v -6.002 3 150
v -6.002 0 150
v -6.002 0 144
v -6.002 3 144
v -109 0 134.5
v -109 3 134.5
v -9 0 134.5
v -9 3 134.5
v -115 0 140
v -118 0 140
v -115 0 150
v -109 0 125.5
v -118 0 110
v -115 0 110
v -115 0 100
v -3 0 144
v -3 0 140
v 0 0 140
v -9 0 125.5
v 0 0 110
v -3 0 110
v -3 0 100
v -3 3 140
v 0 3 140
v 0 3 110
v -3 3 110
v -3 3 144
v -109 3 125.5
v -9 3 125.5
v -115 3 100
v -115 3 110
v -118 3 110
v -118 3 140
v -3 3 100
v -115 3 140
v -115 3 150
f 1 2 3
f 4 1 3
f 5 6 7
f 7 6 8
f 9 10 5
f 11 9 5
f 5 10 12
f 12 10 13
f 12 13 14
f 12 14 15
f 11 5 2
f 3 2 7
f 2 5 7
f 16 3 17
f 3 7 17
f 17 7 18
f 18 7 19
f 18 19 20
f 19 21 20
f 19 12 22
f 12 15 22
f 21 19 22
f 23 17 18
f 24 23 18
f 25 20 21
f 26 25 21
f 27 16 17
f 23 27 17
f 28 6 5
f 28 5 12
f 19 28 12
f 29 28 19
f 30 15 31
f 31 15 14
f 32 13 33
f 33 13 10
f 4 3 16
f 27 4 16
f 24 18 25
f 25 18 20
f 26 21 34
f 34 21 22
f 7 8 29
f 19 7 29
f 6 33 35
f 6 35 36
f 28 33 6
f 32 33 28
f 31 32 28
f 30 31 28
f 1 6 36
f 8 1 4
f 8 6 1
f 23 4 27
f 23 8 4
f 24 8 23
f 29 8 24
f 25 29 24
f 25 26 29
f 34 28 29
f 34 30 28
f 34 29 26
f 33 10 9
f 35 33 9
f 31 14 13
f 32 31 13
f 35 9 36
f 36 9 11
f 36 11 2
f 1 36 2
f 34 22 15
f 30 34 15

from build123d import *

# Parameters (mm, degrees)
LED_1_OUTLINE_R     = 2.25
LED_1_DEPTH         = 3
SKETCH_1_W          = 100
SKETCH_1_H          = 9
CUT_EXTRUDE_1_DEPTH = 3


# Read off the part's stored shape, not the designer's step: 基体零件-LED板-1
with BuildPart() as part:
    # 基体零件-LED板-1 outline → 基体零件-LED板-1 (new body)
    with BuildSketch(Plane(origin=(0, 0, 0), x_dir=(1, 0, 0), z_dir=(0, 1, 0))):
        Polygon((-3, -140), (0, -140), (0, -110), (-3, -110), (-3, -100), (-115, -100), (-115, -110), (-118, -110), (-118, -140), (-115, -140), (-115, -150), (-6.001970153, -150), (-6.001970153, -144), (-3, -144), align=None)
        with Locations((-90.5, -130)):
            Circle(LED_1_OUTLINE_R, mode=Mode.SUBTRACT)
        with Locations((-81.5, -130)):
            Circle(LED_1_OUTLINE_R, mode=Mode.SUBTRACT)
        with Locations((-72.5, -130)):
            Circle(LED_1_OUTLINE_R, mode=Mode.SUBTRACT)
        with Locations((-63.5, -130)):
            Circle(LED_1_OUTLINE_R, mode=Mode.SUBTRACT)
        with Locations((-54.5, -130)):
            Circle(LED_1_OUTLINE_R, mode=Mode.SUBTRACT)
        with Locations((-45.5, -130)):
            Circle(LED_1_OUTLINE_R, mode=Mode.SUBTRACT)
        with Locations((-36.5, -130)):
            Circle(LED_1_OUTLINE_R, mode=Mode.SUBTRACT)
        with Locations((-27.5, -130)):
            Circle(LED_1_OUTLINE_R, mode=Mode.SUBTRACT)
    extrude(amount=LED_1_DEPTH)

    # 草图1 → 切除-拉伸1 (cut)
    with BuildSketch(Plane(origin=(0, 3, 0), x_dir=(1, 0, 0), z_dir=(0, 1, 0))):
        with Locations((-59, -130)):
            Rectangle(SKETCH_1_W, SKETCH_1_H)
    extrude(amount=-CUT_EXTRUDE_1_DEPTH, mode=Mode.SUBTRACT)


solid = part.part
